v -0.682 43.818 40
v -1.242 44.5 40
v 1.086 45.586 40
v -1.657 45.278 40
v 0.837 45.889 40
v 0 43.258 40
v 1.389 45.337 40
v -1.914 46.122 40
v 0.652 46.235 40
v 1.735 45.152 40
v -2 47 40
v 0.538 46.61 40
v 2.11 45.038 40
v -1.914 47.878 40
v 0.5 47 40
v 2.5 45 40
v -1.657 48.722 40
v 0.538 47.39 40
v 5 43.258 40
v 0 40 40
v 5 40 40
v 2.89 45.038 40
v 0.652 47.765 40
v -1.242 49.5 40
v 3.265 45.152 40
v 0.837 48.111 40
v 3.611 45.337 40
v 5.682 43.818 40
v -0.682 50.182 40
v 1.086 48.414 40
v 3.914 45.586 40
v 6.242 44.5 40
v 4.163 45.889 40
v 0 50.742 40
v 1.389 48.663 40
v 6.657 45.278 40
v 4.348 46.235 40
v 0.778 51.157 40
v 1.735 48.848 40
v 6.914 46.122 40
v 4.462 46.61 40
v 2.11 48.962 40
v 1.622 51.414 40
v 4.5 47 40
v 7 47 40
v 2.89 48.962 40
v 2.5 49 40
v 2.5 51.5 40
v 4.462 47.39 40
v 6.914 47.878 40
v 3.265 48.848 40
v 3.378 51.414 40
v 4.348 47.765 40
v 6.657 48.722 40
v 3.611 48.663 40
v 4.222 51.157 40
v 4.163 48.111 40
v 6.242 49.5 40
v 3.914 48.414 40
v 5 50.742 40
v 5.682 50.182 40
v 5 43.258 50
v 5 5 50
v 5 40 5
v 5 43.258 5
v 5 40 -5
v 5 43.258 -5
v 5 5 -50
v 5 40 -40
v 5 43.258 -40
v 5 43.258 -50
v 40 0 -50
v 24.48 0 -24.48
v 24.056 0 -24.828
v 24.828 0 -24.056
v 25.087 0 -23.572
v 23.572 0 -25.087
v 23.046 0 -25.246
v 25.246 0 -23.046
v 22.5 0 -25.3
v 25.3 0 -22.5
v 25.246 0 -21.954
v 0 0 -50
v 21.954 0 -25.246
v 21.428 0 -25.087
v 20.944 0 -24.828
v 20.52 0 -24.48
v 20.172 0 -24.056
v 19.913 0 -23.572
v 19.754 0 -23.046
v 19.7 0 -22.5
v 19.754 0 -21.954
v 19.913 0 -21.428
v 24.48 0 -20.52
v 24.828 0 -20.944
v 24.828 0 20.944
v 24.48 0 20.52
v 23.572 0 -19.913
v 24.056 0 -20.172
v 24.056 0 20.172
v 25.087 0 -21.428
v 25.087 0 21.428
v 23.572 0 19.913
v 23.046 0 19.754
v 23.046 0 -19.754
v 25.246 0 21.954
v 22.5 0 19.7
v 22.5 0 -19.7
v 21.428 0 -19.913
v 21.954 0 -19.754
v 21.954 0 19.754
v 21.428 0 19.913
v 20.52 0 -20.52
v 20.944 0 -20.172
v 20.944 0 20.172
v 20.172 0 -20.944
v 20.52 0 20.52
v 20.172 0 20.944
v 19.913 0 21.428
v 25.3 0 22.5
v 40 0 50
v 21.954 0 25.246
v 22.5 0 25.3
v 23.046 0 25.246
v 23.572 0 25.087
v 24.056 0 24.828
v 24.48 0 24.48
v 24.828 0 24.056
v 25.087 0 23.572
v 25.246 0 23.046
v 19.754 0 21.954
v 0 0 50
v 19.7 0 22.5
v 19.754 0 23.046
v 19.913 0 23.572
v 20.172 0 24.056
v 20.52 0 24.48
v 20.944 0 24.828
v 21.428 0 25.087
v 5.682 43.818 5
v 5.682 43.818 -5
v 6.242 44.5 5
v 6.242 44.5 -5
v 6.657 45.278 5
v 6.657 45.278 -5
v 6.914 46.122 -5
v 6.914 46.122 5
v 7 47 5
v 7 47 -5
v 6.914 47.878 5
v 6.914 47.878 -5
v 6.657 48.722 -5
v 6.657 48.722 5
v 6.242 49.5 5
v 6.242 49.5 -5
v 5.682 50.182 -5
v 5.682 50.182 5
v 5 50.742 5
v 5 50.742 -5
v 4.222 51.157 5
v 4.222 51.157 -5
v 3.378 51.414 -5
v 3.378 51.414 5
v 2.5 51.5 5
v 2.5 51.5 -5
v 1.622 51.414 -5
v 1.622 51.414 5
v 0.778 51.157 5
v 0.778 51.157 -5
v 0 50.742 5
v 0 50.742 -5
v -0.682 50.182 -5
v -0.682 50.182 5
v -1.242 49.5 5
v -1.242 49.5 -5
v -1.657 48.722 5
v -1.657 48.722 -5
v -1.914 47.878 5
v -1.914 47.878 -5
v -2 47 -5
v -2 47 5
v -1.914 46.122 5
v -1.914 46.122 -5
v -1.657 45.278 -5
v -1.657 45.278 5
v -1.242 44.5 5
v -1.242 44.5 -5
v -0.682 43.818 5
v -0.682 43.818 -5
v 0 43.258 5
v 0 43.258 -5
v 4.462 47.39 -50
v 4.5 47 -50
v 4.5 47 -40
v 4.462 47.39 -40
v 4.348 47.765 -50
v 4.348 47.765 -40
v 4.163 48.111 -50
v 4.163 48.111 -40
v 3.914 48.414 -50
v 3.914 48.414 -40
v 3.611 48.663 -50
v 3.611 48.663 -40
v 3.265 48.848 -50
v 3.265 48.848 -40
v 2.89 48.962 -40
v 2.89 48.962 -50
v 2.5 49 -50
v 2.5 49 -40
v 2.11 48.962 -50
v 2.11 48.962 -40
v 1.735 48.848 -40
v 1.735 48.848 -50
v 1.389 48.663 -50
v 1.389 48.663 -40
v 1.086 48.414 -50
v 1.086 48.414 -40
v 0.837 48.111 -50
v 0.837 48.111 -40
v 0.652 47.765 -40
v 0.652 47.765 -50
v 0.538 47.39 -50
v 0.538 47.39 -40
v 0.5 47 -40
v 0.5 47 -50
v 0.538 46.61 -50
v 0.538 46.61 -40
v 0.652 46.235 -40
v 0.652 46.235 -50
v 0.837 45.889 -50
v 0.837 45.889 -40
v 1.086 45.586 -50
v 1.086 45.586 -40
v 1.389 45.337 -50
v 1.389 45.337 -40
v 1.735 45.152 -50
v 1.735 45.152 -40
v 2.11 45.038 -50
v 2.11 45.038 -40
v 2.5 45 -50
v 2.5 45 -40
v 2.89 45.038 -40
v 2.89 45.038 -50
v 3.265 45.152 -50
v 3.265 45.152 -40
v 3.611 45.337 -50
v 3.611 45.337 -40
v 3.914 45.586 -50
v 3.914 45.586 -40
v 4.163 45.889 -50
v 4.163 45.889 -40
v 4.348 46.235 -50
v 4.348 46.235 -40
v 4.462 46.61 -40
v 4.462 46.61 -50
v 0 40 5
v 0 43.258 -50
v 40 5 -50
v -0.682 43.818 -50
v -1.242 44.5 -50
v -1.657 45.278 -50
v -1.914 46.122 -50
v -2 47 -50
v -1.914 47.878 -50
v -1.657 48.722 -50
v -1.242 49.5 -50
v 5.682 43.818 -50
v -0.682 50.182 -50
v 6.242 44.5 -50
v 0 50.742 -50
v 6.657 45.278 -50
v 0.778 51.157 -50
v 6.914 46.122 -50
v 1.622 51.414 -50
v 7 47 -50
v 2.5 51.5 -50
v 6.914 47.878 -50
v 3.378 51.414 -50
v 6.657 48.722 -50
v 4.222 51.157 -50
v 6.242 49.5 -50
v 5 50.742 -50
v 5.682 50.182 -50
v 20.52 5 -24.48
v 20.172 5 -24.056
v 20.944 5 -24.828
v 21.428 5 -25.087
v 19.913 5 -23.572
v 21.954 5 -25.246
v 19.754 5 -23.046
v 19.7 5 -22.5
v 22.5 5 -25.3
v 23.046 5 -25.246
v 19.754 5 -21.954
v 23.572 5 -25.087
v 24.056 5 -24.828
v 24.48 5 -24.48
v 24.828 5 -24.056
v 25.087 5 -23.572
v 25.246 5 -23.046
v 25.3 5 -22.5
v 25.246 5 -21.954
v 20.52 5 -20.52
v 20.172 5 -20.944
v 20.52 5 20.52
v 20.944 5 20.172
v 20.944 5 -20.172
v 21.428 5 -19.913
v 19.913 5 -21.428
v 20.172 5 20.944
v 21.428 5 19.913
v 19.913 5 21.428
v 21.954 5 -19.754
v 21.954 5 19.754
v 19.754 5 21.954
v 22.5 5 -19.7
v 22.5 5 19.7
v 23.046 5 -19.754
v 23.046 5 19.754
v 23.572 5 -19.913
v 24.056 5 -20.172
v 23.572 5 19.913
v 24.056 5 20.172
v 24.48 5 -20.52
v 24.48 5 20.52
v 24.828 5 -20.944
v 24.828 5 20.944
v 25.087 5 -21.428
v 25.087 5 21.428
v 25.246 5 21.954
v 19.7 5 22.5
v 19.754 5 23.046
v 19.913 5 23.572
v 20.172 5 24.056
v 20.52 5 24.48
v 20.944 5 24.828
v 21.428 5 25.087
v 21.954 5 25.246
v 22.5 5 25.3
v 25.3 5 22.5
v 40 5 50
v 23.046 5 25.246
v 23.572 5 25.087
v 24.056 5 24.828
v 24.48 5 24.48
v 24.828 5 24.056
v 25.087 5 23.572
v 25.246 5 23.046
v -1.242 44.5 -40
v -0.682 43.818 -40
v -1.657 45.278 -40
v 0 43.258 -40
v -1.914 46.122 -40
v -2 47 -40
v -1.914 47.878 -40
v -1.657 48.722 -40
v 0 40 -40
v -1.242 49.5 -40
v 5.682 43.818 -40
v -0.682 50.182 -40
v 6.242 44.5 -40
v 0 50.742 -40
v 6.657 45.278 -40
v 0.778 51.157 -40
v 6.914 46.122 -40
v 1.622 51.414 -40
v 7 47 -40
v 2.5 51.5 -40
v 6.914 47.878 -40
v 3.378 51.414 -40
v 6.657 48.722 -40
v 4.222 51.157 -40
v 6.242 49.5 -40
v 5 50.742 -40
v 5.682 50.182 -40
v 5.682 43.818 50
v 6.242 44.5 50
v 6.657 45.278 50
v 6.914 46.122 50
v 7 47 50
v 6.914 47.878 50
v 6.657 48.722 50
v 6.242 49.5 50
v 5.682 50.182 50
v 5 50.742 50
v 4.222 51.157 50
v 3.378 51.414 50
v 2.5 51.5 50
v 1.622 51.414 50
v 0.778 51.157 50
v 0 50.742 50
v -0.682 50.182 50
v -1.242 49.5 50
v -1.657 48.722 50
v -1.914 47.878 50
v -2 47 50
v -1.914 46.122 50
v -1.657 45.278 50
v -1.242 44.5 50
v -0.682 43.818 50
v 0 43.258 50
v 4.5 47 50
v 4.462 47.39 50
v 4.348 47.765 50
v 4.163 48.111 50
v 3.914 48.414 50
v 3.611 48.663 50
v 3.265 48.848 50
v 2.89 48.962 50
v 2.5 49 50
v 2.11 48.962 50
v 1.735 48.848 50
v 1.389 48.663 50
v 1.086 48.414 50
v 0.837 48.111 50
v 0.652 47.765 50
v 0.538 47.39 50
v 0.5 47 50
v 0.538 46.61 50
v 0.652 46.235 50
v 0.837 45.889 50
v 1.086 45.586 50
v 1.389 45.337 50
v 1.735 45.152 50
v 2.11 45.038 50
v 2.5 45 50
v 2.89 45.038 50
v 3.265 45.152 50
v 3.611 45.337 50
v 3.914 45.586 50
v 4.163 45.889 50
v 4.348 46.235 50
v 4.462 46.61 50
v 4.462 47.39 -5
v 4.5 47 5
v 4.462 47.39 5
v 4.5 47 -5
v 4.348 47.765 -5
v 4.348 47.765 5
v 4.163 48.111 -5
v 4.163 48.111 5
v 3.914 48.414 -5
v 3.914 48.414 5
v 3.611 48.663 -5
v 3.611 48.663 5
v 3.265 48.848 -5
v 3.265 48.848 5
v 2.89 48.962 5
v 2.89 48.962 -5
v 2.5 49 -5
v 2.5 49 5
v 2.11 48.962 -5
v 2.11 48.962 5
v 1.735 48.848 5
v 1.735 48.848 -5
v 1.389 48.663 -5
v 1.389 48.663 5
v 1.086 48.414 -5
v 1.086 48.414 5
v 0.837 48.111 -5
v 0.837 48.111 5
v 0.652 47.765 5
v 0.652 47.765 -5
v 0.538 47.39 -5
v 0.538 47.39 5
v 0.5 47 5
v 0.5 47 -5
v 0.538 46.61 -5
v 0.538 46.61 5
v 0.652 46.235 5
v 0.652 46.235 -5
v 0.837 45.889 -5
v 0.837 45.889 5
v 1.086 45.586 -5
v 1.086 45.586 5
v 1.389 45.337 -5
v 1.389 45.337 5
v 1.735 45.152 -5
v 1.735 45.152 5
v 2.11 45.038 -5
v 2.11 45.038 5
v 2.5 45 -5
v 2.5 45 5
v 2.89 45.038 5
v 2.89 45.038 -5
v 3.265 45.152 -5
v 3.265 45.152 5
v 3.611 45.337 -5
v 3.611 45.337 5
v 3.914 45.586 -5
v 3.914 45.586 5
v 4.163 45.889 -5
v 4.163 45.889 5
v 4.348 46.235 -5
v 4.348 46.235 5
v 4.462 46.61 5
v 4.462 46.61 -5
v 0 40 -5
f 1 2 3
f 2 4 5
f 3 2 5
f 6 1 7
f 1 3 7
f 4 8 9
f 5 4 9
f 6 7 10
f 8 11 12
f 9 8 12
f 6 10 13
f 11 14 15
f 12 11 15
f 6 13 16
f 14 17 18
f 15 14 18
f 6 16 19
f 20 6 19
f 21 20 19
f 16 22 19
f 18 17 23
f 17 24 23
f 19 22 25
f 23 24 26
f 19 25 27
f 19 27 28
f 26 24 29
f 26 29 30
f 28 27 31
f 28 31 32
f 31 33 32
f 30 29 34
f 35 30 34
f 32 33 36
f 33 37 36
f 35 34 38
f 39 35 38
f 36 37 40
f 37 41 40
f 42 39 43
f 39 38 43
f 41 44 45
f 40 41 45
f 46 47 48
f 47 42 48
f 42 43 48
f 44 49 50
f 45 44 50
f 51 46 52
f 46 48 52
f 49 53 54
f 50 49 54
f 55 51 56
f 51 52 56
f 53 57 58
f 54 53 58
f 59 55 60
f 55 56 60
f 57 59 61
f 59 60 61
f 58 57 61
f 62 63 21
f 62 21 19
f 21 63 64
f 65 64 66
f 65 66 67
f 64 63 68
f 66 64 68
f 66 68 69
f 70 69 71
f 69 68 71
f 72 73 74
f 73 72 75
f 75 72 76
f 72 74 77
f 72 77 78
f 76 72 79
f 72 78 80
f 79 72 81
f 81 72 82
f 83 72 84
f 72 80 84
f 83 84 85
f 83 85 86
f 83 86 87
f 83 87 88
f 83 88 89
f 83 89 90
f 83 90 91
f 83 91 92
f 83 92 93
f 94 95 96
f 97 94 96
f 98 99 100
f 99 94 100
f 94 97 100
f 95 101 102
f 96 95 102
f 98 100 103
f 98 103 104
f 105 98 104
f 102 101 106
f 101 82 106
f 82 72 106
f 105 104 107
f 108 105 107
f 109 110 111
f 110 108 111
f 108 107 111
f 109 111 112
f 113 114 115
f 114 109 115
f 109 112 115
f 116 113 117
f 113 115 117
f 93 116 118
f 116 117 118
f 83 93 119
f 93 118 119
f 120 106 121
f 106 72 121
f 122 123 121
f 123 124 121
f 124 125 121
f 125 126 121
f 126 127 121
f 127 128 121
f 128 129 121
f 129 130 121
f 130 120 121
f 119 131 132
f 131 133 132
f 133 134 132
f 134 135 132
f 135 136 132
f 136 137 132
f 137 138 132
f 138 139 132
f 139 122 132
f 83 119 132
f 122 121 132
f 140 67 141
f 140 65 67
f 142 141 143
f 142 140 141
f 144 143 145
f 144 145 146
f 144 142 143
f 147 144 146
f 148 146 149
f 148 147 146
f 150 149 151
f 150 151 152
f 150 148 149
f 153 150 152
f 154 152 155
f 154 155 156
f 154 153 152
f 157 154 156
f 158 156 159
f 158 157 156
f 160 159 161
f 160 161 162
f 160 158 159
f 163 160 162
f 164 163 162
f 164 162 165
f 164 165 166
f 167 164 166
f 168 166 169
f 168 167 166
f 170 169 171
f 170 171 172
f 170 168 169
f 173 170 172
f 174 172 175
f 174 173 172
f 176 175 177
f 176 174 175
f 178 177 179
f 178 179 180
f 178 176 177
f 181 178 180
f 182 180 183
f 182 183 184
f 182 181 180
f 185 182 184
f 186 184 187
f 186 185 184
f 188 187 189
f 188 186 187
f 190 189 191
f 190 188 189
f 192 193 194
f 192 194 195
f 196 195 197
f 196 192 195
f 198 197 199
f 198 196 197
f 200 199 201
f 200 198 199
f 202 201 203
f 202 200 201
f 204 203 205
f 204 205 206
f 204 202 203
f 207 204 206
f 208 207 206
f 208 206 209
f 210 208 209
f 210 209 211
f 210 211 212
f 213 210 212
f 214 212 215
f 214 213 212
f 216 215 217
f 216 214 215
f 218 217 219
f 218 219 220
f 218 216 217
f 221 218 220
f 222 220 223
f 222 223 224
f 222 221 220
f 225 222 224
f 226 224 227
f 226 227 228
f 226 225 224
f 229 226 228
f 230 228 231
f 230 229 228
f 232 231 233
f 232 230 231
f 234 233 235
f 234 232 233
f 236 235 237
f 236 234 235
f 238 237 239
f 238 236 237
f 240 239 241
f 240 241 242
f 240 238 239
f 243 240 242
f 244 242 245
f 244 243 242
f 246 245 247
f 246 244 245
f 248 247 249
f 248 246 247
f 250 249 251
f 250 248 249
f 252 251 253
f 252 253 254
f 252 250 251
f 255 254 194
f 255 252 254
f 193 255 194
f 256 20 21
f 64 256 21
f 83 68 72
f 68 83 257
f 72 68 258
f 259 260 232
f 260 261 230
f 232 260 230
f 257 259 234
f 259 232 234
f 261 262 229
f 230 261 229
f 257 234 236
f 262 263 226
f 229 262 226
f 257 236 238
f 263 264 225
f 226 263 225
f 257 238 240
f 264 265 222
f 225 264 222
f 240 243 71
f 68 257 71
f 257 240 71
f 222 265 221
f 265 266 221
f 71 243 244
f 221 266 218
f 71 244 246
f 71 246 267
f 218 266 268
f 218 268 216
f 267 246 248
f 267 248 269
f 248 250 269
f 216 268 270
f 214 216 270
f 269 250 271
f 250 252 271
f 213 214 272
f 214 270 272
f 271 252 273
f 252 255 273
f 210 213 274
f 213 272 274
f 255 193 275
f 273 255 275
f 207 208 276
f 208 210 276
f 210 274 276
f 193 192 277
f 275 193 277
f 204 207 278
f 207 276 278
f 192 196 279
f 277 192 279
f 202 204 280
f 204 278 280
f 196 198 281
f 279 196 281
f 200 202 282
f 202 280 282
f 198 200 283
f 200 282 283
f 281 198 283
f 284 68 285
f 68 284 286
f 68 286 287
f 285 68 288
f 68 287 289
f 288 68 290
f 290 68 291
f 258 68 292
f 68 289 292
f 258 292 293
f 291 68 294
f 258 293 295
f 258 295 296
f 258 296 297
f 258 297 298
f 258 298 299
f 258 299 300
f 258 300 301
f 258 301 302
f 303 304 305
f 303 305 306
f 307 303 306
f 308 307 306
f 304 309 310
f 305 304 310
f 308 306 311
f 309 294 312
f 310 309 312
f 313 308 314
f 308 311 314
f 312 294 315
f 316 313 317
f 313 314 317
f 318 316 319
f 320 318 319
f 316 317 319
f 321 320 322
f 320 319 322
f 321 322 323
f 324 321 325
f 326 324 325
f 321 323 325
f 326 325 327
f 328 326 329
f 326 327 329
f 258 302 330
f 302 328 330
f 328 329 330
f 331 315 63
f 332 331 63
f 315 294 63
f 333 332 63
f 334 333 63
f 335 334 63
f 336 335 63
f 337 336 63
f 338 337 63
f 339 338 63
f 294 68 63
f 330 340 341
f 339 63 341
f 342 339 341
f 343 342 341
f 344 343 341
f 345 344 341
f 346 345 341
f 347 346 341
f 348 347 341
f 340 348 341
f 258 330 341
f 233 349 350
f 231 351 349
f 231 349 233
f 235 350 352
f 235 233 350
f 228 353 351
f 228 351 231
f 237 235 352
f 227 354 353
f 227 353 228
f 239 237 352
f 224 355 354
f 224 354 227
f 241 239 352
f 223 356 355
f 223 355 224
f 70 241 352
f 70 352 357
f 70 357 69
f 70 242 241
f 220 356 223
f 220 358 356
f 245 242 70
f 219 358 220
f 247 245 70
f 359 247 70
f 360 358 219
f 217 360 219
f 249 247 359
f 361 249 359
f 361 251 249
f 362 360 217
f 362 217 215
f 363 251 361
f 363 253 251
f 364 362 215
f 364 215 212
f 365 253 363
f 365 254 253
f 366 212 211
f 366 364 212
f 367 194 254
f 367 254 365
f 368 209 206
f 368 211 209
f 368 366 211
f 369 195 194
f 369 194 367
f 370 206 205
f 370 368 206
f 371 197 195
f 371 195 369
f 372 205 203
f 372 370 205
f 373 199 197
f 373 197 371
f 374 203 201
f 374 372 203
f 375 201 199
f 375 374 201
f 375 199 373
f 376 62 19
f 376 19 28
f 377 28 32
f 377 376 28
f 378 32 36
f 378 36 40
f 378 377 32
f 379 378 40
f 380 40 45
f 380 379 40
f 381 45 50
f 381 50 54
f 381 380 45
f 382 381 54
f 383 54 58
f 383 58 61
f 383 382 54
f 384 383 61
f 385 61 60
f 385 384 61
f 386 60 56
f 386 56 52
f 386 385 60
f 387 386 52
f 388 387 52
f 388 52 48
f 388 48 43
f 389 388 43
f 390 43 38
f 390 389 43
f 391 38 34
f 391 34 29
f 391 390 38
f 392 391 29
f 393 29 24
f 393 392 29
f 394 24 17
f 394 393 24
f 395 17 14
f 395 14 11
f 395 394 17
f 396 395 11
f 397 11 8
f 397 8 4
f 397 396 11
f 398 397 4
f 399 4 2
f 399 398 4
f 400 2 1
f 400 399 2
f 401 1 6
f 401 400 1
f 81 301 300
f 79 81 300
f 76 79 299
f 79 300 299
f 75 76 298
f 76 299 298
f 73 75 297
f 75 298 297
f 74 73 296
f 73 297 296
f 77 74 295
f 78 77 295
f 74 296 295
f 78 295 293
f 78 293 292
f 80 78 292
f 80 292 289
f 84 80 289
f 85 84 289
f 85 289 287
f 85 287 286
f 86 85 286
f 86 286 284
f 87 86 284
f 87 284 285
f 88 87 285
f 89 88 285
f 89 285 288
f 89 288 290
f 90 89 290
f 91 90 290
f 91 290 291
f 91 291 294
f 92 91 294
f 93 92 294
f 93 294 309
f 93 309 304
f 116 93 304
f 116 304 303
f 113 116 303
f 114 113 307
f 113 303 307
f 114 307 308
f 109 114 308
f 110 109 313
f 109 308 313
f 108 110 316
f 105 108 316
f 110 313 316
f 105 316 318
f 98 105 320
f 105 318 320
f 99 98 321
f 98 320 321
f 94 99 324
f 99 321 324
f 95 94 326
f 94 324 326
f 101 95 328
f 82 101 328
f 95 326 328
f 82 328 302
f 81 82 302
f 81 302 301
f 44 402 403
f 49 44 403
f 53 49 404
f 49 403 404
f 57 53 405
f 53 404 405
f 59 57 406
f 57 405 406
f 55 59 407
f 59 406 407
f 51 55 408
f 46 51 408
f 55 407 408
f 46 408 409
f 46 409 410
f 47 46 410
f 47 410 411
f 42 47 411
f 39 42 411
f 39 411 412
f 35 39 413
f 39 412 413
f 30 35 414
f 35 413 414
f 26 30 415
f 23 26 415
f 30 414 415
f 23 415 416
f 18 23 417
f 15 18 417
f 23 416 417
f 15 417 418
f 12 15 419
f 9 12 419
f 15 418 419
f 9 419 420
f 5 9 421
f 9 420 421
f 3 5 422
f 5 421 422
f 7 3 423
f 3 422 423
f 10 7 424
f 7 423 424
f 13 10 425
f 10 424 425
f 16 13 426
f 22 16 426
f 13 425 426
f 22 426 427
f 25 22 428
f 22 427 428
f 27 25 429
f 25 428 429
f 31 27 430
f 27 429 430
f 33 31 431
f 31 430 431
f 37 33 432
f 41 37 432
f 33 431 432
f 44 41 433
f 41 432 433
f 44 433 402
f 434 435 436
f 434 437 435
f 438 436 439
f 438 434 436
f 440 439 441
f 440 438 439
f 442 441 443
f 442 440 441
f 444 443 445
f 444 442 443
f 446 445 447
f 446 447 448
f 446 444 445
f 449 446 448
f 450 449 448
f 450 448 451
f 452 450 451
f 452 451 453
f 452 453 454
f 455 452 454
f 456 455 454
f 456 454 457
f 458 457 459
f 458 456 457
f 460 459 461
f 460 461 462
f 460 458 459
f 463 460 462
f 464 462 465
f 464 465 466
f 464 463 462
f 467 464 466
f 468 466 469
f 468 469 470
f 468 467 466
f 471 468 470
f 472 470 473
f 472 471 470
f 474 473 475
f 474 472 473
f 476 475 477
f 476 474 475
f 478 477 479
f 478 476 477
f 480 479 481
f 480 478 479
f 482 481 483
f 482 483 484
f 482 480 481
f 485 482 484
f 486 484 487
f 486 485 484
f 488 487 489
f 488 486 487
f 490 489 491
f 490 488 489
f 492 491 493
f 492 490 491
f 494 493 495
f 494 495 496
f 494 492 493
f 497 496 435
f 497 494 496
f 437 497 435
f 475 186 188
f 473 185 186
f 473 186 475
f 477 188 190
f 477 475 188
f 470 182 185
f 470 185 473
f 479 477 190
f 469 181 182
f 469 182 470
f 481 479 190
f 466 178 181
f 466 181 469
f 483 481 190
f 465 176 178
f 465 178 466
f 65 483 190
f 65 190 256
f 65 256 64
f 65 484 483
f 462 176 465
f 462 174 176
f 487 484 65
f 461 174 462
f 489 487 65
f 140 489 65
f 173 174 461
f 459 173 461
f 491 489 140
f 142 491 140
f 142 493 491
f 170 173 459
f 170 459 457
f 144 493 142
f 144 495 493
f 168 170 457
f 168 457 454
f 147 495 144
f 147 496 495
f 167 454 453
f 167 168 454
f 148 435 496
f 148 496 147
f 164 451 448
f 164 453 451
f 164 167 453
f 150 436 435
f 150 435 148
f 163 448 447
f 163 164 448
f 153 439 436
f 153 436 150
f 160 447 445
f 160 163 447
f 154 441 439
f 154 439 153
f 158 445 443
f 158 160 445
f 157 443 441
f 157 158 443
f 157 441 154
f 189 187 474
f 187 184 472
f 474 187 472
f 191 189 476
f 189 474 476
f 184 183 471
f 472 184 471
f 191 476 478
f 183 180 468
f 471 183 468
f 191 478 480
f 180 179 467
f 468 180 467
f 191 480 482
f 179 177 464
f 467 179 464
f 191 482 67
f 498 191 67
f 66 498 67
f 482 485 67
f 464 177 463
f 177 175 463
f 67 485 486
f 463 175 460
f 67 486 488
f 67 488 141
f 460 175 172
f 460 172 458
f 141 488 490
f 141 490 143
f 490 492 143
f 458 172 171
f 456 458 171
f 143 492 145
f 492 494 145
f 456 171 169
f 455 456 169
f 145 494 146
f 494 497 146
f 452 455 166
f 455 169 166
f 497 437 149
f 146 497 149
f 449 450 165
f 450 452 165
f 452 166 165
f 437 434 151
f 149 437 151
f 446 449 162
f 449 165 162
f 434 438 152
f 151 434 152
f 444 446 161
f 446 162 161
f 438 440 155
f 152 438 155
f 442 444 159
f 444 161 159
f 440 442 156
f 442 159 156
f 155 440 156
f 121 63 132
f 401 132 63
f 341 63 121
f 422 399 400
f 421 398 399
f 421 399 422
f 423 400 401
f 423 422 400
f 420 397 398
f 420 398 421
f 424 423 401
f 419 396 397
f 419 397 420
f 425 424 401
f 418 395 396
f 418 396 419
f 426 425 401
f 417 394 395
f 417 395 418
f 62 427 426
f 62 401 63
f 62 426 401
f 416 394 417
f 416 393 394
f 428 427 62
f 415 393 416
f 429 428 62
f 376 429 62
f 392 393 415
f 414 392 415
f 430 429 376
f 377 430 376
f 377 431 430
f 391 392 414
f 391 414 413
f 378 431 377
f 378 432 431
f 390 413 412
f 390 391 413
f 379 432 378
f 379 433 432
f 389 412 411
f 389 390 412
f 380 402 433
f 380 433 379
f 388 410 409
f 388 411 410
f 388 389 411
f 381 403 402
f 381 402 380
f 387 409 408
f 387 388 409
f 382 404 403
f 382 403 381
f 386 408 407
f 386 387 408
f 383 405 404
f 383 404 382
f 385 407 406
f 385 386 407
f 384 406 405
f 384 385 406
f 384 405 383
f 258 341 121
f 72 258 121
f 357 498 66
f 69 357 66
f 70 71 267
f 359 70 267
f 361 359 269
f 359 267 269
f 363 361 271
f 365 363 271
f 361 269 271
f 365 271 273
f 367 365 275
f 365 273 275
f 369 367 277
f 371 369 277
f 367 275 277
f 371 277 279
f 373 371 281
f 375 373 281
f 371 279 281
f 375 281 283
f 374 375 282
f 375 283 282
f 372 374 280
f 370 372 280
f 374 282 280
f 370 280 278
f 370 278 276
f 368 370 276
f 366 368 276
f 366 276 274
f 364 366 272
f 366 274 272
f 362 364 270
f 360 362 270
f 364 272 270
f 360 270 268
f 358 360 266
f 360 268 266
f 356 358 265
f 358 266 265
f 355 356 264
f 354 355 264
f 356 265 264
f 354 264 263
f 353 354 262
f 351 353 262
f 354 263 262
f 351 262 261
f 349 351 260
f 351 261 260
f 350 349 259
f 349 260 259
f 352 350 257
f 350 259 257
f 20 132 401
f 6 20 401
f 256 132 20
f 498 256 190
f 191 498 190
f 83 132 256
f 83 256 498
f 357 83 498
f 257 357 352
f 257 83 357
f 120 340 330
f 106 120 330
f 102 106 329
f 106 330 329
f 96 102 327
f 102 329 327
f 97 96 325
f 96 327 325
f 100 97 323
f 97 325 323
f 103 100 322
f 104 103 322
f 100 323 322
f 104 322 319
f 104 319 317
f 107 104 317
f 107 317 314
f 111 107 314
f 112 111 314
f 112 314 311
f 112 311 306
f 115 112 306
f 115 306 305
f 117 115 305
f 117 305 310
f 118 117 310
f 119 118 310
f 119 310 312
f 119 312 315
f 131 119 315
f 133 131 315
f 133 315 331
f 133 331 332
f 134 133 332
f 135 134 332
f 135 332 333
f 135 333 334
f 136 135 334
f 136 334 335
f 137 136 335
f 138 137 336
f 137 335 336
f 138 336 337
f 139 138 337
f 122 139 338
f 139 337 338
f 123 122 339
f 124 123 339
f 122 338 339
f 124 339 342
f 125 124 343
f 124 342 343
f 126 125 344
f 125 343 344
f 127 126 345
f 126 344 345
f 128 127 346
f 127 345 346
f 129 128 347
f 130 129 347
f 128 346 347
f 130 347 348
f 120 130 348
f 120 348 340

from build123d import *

# Parameters (mm, degrees)
BOSS_EXTRUDE1_DEPTH = 50
SKETCH7_R           = 4.5
SKETCH7_R_2         = 2
SKETCH7_W           = 5
SKETCH7_H           = 3.258342613
BOSS_EXTRUDE4_DEPTH = 5
SKETCH2_R           = 4.5
SKETCH2_R_2         = 2
SKETCH2_W           = 5
SKETCH2_H           = 3.258342613
BOSS_EXTRUDE3_DEPTH = 10
SKETCH12_R          = 2.8
CUT_EXTRUDE1_DEPTH  = 6


with BuildPart() as part:
    # Sketch1 → Boss-Extrude1 (new body, symmetric)
    with BuildSketch(Plane.XY):
        Polygon((0, 0), (0, 40), (5, 40), (5, 5), (40, 5), (40, 0), align=None)
    extrude(amount=BOSS_EXTRUDE1_DEPTH, both=True)

    # Sketch7 → Boss-Extrude4 (add, symmetric)
    with BuildSketch(Plane.XY):
        with Locations((2.5, 47)):
            Circle(SKETCH7_R)
        with Locations((2.5, 47)):
            Circle(SKETCH7_R_2, mode=Mode.SUBTRACT)
        with Locations((2.5, 41.629171306)):
            Rectangle(SKETCH7_W, SKETCH7_H)
    extrude(amount=BOSS_EXTRUDE4_DEPTH, both=True)

    # Sketch2 → Boss-Extrude3 (add)
    with BuildSketch(Plane.XY.offset(50)):
        with Locations((2.5, 47)):
            Circle(SKETCH2_R)
        with Locations((2.5, 47)):
            Circle(SKETCH2_R_2, mode=Mode.SUBTRACT)
        with Locations((2.5, 41.629171306)):
            Rectangle(SKETCH2_W, SKETCH2_H)
    boss_extrude3 = extrude(amount=-BOSS_EXTRUDE3_DEPTH)

    # Mirror1: Boss-Extrude3 across plane
    add(boss_extrude3.mirror(Plane.XY))

    # Sketch12 → Cut-Extrude1 (cut, through all)
    with BuildSketch(Plane(origin=(0, 5, 0), x_dir=(1, 0, 0), z_dir=(0, 1, 0))):
        with Locations((22.5, 22.5)):
            Circle(SKETCH12_R)
        with Locations((22.5, -22.5)):
            Circle(SKETCH12_R)
    extrude(amount=-CUT_EXTRUDE1_DEPTH, mode=Mode.SUBTRACT)


solid = part.part
